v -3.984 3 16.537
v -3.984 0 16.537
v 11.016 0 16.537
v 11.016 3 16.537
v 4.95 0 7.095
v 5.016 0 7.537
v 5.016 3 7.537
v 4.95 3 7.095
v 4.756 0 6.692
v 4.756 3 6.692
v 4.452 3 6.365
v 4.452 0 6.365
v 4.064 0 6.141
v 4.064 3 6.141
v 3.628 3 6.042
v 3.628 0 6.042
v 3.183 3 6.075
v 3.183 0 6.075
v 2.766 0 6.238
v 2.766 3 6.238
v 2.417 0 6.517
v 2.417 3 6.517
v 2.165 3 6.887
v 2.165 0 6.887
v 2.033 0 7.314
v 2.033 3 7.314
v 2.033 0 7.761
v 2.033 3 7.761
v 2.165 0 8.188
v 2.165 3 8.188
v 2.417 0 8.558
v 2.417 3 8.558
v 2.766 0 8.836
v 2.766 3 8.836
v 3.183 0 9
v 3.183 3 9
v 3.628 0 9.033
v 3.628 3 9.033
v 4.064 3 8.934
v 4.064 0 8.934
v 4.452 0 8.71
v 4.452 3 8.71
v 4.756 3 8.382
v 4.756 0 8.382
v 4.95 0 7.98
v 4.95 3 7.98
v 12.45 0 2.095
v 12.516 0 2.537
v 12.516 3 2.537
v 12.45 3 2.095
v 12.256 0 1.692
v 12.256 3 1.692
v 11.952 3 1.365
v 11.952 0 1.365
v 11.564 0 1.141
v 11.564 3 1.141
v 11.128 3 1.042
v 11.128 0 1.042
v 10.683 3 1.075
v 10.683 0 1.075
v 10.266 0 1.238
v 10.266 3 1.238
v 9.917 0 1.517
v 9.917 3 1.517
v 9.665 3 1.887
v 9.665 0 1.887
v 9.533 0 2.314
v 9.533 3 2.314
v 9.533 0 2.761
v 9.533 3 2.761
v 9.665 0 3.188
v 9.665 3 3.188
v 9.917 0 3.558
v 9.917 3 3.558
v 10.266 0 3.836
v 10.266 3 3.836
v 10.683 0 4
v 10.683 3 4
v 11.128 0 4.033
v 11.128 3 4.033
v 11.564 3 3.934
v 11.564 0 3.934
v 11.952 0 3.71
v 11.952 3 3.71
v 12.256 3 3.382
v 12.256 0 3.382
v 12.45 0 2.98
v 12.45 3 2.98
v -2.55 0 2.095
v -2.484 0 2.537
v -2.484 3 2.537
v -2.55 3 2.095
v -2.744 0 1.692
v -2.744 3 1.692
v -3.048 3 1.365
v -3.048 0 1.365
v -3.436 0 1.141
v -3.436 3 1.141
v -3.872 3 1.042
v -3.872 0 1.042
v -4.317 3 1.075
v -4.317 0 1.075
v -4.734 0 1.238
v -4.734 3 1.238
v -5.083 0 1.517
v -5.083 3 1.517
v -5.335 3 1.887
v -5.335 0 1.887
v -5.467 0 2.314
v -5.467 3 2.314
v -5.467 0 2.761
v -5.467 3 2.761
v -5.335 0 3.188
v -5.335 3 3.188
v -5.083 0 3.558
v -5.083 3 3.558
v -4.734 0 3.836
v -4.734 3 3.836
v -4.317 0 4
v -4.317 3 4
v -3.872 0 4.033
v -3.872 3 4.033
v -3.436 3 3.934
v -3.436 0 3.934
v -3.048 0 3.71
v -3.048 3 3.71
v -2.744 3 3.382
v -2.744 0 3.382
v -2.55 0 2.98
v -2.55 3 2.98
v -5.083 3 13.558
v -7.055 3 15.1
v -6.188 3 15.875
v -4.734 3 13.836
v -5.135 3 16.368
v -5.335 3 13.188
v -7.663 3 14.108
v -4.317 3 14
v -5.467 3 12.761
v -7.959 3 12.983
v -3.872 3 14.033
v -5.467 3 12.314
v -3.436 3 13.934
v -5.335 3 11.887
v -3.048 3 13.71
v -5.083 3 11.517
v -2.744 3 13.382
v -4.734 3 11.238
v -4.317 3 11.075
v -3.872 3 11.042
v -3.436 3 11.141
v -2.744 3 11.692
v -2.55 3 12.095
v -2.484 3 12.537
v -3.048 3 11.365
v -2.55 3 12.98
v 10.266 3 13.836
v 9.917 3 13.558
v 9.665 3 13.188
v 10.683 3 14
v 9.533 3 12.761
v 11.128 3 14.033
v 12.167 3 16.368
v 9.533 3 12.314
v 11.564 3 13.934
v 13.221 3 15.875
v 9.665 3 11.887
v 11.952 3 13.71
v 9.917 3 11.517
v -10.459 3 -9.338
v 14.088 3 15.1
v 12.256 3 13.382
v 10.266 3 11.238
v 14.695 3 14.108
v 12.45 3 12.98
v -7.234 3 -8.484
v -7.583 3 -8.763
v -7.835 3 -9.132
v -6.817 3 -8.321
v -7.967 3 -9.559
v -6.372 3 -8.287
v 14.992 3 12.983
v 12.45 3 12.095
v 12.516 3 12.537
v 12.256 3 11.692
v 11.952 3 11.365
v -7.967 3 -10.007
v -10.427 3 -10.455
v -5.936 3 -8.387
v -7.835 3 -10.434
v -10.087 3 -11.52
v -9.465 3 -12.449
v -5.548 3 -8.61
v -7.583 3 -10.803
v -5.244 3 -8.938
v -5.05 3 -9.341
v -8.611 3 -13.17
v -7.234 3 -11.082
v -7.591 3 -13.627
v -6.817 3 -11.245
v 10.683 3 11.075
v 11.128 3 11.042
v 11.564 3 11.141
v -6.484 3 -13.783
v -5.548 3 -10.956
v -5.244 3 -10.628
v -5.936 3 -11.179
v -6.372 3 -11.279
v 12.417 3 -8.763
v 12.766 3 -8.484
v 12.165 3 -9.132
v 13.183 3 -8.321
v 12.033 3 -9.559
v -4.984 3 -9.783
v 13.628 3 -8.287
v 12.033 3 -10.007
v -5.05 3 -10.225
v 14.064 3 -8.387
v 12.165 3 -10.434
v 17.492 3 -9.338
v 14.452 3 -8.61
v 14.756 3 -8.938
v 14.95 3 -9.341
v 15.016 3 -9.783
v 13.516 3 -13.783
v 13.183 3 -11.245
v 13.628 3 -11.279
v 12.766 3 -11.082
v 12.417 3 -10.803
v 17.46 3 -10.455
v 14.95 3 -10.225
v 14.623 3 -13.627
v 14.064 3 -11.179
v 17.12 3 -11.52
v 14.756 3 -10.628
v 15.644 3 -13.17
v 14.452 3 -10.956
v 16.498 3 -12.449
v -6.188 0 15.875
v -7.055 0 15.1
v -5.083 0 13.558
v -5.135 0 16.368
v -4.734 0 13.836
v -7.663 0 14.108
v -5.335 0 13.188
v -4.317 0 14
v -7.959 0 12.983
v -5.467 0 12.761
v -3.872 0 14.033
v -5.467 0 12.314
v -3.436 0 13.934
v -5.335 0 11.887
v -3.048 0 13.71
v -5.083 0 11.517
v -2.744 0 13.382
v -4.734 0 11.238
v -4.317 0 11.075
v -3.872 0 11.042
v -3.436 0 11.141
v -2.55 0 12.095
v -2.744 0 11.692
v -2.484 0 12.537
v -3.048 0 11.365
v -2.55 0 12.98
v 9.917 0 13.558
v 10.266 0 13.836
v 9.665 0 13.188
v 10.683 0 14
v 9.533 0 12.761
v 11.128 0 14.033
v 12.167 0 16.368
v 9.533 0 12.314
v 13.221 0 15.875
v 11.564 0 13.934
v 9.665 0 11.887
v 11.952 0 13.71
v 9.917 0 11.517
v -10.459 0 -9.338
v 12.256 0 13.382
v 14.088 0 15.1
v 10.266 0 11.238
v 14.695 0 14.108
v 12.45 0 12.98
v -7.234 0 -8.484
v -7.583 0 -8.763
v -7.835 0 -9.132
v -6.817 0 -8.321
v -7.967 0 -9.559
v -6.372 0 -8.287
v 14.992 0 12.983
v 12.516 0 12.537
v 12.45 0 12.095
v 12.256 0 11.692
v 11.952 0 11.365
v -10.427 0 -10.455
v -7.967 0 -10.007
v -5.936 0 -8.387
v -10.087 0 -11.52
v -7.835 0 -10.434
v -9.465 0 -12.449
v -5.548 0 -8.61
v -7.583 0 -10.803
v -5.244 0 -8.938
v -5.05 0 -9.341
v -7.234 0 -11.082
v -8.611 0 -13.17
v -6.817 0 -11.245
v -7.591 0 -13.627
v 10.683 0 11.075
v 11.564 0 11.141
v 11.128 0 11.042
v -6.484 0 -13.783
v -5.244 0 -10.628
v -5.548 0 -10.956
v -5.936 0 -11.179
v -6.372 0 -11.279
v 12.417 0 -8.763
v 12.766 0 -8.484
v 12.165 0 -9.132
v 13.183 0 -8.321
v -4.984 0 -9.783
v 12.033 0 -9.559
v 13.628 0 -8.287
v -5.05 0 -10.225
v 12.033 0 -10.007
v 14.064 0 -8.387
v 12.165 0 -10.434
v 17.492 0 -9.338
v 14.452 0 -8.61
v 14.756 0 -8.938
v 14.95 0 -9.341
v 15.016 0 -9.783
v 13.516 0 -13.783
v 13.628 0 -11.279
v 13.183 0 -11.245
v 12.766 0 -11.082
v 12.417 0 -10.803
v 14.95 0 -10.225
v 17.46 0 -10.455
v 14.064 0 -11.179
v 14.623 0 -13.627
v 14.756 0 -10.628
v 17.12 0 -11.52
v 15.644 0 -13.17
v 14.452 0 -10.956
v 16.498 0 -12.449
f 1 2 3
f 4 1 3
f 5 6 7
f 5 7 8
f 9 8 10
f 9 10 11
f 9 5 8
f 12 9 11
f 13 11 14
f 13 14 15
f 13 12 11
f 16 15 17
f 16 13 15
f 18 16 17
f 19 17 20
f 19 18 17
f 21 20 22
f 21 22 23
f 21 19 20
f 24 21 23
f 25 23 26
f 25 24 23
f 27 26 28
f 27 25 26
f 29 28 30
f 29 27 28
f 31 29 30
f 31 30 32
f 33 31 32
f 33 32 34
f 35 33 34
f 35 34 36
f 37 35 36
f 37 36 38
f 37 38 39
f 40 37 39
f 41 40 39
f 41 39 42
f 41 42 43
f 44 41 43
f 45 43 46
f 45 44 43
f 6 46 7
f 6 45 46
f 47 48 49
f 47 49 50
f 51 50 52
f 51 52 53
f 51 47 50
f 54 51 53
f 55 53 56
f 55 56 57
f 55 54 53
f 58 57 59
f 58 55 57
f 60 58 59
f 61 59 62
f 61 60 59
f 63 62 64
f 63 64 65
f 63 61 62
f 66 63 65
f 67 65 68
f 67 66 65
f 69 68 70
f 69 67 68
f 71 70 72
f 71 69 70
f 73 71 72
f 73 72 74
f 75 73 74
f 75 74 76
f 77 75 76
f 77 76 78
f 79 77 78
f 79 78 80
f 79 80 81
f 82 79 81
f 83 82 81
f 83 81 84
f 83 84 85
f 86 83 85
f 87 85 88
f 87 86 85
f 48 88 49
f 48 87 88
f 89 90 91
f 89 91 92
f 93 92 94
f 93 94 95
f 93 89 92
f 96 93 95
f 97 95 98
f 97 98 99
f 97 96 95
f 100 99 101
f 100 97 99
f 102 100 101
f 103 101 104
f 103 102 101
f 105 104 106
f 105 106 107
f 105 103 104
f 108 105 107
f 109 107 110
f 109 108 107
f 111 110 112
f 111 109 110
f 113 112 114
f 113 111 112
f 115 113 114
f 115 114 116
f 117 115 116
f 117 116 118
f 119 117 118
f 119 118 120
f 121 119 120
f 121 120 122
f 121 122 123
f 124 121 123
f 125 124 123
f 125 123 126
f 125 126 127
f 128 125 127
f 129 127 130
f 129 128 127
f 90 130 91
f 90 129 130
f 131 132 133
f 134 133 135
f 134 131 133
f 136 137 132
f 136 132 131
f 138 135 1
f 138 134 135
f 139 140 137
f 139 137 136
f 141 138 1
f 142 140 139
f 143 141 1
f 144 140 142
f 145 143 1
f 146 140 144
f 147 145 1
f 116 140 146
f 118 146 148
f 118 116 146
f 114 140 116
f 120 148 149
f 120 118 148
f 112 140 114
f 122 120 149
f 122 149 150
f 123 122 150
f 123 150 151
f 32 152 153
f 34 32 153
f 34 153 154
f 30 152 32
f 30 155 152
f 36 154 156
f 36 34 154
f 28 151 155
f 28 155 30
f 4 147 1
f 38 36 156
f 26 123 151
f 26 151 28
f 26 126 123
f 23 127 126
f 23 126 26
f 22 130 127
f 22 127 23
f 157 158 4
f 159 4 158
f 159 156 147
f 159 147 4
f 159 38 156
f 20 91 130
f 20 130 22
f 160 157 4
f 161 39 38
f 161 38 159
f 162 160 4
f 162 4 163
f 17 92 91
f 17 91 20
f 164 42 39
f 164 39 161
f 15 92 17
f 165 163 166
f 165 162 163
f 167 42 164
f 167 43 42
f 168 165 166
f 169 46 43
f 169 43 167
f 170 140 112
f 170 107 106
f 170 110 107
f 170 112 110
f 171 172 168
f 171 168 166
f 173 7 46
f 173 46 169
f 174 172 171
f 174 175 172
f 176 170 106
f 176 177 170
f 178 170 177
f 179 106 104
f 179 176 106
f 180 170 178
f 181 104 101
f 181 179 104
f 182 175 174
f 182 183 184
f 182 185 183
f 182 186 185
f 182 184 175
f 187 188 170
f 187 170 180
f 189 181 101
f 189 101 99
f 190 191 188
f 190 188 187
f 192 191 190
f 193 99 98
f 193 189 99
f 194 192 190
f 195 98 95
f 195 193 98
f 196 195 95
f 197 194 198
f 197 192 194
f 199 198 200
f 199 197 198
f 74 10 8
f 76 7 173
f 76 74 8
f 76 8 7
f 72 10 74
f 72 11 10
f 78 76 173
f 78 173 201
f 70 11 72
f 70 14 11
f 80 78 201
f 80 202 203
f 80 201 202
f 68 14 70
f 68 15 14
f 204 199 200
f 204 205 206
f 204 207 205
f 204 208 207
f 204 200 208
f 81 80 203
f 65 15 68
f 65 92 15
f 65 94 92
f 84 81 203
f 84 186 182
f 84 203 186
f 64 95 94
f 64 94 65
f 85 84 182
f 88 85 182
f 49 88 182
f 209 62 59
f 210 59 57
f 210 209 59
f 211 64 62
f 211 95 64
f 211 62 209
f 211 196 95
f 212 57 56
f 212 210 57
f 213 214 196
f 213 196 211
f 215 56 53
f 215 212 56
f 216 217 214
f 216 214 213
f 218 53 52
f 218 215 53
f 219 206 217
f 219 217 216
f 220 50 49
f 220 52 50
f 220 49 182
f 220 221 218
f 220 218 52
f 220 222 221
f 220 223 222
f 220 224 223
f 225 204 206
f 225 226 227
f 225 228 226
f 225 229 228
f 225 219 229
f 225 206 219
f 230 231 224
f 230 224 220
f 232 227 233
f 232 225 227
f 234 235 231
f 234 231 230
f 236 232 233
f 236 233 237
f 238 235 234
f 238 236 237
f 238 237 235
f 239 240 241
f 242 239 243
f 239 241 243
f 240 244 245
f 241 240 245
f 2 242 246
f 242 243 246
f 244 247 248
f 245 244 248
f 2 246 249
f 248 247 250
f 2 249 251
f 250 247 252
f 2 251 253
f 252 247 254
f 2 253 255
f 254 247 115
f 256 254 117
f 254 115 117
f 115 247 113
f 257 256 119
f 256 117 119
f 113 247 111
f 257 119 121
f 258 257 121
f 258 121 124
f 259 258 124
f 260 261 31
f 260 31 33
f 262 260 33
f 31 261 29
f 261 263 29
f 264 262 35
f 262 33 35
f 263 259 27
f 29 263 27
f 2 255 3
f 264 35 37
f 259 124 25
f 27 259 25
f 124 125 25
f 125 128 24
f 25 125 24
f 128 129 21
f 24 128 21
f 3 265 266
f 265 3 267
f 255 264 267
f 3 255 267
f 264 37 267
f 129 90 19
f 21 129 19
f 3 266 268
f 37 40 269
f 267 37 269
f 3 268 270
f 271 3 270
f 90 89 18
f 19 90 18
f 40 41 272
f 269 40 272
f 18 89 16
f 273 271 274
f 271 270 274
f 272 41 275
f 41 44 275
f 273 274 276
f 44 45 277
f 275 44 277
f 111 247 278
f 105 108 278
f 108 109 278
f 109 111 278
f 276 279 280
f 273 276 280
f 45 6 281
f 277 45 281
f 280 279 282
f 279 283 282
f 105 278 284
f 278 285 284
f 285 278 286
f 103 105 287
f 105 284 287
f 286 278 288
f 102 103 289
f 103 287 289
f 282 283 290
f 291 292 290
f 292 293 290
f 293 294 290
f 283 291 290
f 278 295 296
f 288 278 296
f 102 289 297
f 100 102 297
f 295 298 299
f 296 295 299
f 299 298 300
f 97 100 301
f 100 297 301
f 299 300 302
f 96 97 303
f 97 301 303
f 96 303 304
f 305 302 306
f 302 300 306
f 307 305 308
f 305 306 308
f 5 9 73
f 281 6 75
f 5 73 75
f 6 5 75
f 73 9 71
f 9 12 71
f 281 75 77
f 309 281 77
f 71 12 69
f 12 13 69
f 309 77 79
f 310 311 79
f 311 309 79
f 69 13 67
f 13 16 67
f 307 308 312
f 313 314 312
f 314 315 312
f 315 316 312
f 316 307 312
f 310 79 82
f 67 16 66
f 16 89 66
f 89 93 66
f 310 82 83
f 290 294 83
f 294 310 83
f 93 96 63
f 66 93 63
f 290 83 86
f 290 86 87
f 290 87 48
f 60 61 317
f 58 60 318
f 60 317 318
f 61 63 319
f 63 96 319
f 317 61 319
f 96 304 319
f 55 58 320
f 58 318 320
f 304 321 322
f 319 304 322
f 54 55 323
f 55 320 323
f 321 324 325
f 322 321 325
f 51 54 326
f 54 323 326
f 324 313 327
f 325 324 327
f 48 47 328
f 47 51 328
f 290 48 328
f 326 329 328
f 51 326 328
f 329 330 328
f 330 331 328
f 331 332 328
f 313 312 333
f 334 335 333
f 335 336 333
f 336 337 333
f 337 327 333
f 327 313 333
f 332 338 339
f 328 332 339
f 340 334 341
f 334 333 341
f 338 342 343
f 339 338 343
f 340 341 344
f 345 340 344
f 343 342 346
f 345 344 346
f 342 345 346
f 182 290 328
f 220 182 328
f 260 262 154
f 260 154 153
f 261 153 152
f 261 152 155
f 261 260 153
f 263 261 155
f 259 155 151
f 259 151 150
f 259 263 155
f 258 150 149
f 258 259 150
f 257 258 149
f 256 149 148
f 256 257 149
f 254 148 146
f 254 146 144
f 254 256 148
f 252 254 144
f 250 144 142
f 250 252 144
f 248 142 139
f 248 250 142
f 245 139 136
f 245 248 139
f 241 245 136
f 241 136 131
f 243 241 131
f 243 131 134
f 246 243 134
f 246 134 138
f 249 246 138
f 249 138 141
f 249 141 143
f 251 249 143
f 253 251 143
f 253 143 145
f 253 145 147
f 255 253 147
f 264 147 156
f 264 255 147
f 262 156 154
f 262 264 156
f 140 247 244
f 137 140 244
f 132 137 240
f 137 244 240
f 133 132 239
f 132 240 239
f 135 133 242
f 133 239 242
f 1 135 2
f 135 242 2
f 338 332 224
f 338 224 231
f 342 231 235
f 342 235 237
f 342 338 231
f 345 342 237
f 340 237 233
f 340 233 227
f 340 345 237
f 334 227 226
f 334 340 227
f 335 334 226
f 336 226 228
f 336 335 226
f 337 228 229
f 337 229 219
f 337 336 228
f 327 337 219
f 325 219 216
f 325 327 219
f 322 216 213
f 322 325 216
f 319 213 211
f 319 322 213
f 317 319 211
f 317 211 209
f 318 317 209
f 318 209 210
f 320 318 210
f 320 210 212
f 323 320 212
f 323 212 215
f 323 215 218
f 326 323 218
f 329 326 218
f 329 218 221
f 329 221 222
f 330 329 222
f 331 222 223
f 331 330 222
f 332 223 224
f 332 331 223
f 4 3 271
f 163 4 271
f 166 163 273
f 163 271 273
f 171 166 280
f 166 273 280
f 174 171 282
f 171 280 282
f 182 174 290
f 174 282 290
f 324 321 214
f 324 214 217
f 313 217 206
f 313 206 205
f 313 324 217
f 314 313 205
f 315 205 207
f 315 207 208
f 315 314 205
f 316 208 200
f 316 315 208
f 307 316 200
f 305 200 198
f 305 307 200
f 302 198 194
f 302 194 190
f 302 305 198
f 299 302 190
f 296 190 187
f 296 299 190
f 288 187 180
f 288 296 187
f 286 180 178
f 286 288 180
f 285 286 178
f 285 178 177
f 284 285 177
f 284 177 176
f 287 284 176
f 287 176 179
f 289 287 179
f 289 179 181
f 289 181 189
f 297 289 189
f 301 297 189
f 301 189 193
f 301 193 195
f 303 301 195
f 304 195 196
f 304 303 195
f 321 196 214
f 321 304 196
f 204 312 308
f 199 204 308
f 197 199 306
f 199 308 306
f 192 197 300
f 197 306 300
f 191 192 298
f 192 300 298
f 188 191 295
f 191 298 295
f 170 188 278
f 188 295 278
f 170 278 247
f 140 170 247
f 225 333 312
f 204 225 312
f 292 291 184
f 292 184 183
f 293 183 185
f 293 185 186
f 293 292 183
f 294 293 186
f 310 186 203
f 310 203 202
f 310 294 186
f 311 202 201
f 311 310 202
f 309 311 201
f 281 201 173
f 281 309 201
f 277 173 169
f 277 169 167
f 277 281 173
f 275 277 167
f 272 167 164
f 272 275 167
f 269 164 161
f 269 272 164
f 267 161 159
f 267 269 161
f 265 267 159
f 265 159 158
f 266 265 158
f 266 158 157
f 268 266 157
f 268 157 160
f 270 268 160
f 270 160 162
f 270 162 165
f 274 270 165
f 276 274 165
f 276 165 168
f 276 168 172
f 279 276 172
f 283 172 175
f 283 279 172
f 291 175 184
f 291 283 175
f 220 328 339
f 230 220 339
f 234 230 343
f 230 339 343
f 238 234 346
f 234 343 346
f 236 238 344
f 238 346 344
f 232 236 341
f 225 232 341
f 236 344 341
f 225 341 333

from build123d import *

# Parameters (mm, degrees)
SKETCH1_R           = 1.5
BOSS_EXTRUDE1_DEPTH = 3


with BuildPart() as part:
    # Sketch1 → Boss-Extrude1 (new body)
    with BuildSketch(Plane(origin=(0, 0, 0), x_dir=(1, 0, 0), z_dir=(0, 1, 0))):
        with BuildLine():
            Line((-10.458743839, 9.337820174), (-7.958743839, -12.982687901))
            ThreePointArc((-7.958743839, -12.982687901), (-6.649970685, -15.519142393), (-3.983600283, -16.537453462))
            Line((-3.983600283, -16.537453462), (11.016399717, -16.537453462))
            ThreePointArc((11.016399717, -16.537453462), (13.68277012, -15.519142393), (14.991543274, -12.982687901))
            Line((14.991543274, -12.982687901), (17.491543274, 9.337820174))
            ThreePointArc((17.491543274, 9.337820174), (16.498088648, 12.449425016), (13.516399717, 13.783054613))
            Line((13.516399717, 13.783054613), (-6.483600283, 13.783054613))
            ThreePointArc((-6.483600283, 13.783054613), (-9.465289213, 12.449425016), (-10.458743839, 9.337820174))
        make_face()
        with Locations((-3.983600283, -12.537453462)):
            Circle(SKETCH1_R, mode=Mode.SUBTRACT)
        with Locations((11.016399717, -12.537453462)):
            Circle(SKETCH1_R, mode=Mode.SUBTRACT)
        with Locations((3.516399717, -7.537453462)):
            Circle(SKETCH1_R, mode=Mode.SUBTRACT)
        with Locations((11.016399717, -2.537453462)):
            Circle(SKETCH1_R, mode=Mode.SUBTRACT)
        with Locations((-3.983600283, -2.537453462)):
            Circle(SKETCH1_R, mode=Mode.SUBTRACT)
        with Locations((13.516399717, 9.783054613)):
            Circle(SKETCH1_R, mode=Mode.SUBTRACT)
        with Locations((-6.483600283, 9.783054613)):
            Circle(SKETCH1_R, mode=Mode.SUBTRACT)
    extrude(amount=BOSS_EXTRUDE1_DEPTH)


solid = part.part
